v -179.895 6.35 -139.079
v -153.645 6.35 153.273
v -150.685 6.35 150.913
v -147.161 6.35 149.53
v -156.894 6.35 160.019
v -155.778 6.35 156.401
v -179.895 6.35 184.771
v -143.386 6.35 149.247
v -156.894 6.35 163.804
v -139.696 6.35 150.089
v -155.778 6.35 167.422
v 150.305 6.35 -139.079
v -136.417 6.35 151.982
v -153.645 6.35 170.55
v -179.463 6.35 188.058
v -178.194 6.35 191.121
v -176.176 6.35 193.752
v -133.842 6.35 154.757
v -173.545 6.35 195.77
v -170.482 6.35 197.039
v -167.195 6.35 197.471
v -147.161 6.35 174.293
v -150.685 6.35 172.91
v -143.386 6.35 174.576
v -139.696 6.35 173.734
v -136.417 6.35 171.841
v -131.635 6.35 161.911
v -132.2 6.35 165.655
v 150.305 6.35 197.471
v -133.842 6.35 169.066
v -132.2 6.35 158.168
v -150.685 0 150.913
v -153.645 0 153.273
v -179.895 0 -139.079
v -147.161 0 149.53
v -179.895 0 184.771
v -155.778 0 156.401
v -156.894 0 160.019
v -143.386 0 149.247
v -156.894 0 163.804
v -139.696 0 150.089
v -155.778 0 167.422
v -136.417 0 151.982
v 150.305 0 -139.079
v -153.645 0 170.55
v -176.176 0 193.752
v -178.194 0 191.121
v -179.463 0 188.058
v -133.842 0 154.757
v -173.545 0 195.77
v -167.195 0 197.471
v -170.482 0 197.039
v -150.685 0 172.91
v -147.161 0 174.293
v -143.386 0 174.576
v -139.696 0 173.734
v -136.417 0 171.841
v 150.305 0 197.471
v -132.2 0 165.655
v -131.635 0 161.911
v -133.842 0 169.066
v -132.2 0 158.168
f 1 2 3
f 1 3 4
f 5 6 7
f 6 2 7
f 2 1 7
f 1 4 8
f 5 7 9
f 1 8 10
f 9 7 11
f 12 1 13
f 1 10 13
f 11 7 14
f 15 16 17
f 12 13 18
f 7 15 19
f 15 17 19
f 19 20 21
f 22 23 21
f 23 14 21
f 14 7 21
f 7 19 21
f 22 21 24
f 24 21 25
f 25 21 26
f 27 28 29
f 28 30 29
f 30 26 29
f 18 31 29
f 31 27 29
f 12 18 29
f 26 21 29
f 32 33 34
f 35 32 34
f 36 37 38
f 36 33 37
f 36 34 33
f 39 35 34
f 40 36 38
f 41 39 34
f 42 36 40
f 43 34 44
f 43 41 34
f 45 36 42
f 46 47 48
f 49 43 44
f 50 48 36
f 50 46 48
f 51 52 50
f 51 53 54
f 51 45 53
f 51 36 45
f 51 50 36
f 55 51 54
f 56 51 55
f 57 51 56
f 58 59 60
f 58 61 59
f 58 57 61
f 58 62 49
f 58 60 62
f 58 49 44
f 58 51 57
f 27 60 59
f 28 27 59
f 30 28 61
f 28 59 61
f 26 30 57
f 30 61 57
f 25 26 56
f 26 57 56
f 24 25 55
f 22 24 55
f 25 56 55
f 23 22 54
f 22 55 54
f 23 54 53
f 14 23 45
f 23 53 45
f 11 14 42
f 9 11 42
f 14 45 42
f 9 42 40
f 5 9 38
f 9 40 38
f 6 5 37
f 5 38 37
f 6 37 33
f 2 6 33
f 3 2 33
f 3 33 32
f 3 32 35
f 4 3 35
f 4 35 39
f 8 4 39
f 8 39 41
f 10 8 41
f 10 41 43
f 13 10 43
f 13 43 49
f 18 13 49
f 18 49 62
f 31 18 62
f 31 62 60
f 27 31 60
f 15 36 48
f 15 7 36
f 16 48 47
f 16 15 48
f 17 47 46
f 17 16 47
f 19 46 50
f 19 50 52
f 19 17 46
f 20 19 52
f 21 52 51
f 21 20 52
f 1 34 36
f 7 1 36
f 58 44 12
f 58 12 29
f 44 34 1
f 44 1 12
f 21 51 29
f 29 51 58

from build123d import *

# Parameters (mm, degrees)
F0_W     = 330.2
F0_H     = 336.55
F1_DEPTH = 6.35
F2_R     = 12.7
F3_R     = 12.7
F4_DEPTH = 25.4


with BuildPart() as f1:
    # F0 (on Front) → F1 (new body)
    with BuildSketch(Plane.XZ):
        with Locations((-14.795402, 29.196472)):
            Rectangle(F0_W, F0_H)
    extrude(amount=-F1_DEPTH)

    # F2
    f2_edges = [f1.edges().sort_by_distance(p)[0] for p in [
        (-179.895402, 3.175, 197.471472),
    ]]
    fillet(f2_edges, radius=F2_R)

    # F3 (on face) → F4 (cut)
    with BuildSketch(Plane.XZ):
        with Locations((-144.335402, 161.911472)):
            Circle(F3_R)
    extrude(amount=-F4_DEPTH, mode=Mode.SUBTRACT)


solid = f1.part
